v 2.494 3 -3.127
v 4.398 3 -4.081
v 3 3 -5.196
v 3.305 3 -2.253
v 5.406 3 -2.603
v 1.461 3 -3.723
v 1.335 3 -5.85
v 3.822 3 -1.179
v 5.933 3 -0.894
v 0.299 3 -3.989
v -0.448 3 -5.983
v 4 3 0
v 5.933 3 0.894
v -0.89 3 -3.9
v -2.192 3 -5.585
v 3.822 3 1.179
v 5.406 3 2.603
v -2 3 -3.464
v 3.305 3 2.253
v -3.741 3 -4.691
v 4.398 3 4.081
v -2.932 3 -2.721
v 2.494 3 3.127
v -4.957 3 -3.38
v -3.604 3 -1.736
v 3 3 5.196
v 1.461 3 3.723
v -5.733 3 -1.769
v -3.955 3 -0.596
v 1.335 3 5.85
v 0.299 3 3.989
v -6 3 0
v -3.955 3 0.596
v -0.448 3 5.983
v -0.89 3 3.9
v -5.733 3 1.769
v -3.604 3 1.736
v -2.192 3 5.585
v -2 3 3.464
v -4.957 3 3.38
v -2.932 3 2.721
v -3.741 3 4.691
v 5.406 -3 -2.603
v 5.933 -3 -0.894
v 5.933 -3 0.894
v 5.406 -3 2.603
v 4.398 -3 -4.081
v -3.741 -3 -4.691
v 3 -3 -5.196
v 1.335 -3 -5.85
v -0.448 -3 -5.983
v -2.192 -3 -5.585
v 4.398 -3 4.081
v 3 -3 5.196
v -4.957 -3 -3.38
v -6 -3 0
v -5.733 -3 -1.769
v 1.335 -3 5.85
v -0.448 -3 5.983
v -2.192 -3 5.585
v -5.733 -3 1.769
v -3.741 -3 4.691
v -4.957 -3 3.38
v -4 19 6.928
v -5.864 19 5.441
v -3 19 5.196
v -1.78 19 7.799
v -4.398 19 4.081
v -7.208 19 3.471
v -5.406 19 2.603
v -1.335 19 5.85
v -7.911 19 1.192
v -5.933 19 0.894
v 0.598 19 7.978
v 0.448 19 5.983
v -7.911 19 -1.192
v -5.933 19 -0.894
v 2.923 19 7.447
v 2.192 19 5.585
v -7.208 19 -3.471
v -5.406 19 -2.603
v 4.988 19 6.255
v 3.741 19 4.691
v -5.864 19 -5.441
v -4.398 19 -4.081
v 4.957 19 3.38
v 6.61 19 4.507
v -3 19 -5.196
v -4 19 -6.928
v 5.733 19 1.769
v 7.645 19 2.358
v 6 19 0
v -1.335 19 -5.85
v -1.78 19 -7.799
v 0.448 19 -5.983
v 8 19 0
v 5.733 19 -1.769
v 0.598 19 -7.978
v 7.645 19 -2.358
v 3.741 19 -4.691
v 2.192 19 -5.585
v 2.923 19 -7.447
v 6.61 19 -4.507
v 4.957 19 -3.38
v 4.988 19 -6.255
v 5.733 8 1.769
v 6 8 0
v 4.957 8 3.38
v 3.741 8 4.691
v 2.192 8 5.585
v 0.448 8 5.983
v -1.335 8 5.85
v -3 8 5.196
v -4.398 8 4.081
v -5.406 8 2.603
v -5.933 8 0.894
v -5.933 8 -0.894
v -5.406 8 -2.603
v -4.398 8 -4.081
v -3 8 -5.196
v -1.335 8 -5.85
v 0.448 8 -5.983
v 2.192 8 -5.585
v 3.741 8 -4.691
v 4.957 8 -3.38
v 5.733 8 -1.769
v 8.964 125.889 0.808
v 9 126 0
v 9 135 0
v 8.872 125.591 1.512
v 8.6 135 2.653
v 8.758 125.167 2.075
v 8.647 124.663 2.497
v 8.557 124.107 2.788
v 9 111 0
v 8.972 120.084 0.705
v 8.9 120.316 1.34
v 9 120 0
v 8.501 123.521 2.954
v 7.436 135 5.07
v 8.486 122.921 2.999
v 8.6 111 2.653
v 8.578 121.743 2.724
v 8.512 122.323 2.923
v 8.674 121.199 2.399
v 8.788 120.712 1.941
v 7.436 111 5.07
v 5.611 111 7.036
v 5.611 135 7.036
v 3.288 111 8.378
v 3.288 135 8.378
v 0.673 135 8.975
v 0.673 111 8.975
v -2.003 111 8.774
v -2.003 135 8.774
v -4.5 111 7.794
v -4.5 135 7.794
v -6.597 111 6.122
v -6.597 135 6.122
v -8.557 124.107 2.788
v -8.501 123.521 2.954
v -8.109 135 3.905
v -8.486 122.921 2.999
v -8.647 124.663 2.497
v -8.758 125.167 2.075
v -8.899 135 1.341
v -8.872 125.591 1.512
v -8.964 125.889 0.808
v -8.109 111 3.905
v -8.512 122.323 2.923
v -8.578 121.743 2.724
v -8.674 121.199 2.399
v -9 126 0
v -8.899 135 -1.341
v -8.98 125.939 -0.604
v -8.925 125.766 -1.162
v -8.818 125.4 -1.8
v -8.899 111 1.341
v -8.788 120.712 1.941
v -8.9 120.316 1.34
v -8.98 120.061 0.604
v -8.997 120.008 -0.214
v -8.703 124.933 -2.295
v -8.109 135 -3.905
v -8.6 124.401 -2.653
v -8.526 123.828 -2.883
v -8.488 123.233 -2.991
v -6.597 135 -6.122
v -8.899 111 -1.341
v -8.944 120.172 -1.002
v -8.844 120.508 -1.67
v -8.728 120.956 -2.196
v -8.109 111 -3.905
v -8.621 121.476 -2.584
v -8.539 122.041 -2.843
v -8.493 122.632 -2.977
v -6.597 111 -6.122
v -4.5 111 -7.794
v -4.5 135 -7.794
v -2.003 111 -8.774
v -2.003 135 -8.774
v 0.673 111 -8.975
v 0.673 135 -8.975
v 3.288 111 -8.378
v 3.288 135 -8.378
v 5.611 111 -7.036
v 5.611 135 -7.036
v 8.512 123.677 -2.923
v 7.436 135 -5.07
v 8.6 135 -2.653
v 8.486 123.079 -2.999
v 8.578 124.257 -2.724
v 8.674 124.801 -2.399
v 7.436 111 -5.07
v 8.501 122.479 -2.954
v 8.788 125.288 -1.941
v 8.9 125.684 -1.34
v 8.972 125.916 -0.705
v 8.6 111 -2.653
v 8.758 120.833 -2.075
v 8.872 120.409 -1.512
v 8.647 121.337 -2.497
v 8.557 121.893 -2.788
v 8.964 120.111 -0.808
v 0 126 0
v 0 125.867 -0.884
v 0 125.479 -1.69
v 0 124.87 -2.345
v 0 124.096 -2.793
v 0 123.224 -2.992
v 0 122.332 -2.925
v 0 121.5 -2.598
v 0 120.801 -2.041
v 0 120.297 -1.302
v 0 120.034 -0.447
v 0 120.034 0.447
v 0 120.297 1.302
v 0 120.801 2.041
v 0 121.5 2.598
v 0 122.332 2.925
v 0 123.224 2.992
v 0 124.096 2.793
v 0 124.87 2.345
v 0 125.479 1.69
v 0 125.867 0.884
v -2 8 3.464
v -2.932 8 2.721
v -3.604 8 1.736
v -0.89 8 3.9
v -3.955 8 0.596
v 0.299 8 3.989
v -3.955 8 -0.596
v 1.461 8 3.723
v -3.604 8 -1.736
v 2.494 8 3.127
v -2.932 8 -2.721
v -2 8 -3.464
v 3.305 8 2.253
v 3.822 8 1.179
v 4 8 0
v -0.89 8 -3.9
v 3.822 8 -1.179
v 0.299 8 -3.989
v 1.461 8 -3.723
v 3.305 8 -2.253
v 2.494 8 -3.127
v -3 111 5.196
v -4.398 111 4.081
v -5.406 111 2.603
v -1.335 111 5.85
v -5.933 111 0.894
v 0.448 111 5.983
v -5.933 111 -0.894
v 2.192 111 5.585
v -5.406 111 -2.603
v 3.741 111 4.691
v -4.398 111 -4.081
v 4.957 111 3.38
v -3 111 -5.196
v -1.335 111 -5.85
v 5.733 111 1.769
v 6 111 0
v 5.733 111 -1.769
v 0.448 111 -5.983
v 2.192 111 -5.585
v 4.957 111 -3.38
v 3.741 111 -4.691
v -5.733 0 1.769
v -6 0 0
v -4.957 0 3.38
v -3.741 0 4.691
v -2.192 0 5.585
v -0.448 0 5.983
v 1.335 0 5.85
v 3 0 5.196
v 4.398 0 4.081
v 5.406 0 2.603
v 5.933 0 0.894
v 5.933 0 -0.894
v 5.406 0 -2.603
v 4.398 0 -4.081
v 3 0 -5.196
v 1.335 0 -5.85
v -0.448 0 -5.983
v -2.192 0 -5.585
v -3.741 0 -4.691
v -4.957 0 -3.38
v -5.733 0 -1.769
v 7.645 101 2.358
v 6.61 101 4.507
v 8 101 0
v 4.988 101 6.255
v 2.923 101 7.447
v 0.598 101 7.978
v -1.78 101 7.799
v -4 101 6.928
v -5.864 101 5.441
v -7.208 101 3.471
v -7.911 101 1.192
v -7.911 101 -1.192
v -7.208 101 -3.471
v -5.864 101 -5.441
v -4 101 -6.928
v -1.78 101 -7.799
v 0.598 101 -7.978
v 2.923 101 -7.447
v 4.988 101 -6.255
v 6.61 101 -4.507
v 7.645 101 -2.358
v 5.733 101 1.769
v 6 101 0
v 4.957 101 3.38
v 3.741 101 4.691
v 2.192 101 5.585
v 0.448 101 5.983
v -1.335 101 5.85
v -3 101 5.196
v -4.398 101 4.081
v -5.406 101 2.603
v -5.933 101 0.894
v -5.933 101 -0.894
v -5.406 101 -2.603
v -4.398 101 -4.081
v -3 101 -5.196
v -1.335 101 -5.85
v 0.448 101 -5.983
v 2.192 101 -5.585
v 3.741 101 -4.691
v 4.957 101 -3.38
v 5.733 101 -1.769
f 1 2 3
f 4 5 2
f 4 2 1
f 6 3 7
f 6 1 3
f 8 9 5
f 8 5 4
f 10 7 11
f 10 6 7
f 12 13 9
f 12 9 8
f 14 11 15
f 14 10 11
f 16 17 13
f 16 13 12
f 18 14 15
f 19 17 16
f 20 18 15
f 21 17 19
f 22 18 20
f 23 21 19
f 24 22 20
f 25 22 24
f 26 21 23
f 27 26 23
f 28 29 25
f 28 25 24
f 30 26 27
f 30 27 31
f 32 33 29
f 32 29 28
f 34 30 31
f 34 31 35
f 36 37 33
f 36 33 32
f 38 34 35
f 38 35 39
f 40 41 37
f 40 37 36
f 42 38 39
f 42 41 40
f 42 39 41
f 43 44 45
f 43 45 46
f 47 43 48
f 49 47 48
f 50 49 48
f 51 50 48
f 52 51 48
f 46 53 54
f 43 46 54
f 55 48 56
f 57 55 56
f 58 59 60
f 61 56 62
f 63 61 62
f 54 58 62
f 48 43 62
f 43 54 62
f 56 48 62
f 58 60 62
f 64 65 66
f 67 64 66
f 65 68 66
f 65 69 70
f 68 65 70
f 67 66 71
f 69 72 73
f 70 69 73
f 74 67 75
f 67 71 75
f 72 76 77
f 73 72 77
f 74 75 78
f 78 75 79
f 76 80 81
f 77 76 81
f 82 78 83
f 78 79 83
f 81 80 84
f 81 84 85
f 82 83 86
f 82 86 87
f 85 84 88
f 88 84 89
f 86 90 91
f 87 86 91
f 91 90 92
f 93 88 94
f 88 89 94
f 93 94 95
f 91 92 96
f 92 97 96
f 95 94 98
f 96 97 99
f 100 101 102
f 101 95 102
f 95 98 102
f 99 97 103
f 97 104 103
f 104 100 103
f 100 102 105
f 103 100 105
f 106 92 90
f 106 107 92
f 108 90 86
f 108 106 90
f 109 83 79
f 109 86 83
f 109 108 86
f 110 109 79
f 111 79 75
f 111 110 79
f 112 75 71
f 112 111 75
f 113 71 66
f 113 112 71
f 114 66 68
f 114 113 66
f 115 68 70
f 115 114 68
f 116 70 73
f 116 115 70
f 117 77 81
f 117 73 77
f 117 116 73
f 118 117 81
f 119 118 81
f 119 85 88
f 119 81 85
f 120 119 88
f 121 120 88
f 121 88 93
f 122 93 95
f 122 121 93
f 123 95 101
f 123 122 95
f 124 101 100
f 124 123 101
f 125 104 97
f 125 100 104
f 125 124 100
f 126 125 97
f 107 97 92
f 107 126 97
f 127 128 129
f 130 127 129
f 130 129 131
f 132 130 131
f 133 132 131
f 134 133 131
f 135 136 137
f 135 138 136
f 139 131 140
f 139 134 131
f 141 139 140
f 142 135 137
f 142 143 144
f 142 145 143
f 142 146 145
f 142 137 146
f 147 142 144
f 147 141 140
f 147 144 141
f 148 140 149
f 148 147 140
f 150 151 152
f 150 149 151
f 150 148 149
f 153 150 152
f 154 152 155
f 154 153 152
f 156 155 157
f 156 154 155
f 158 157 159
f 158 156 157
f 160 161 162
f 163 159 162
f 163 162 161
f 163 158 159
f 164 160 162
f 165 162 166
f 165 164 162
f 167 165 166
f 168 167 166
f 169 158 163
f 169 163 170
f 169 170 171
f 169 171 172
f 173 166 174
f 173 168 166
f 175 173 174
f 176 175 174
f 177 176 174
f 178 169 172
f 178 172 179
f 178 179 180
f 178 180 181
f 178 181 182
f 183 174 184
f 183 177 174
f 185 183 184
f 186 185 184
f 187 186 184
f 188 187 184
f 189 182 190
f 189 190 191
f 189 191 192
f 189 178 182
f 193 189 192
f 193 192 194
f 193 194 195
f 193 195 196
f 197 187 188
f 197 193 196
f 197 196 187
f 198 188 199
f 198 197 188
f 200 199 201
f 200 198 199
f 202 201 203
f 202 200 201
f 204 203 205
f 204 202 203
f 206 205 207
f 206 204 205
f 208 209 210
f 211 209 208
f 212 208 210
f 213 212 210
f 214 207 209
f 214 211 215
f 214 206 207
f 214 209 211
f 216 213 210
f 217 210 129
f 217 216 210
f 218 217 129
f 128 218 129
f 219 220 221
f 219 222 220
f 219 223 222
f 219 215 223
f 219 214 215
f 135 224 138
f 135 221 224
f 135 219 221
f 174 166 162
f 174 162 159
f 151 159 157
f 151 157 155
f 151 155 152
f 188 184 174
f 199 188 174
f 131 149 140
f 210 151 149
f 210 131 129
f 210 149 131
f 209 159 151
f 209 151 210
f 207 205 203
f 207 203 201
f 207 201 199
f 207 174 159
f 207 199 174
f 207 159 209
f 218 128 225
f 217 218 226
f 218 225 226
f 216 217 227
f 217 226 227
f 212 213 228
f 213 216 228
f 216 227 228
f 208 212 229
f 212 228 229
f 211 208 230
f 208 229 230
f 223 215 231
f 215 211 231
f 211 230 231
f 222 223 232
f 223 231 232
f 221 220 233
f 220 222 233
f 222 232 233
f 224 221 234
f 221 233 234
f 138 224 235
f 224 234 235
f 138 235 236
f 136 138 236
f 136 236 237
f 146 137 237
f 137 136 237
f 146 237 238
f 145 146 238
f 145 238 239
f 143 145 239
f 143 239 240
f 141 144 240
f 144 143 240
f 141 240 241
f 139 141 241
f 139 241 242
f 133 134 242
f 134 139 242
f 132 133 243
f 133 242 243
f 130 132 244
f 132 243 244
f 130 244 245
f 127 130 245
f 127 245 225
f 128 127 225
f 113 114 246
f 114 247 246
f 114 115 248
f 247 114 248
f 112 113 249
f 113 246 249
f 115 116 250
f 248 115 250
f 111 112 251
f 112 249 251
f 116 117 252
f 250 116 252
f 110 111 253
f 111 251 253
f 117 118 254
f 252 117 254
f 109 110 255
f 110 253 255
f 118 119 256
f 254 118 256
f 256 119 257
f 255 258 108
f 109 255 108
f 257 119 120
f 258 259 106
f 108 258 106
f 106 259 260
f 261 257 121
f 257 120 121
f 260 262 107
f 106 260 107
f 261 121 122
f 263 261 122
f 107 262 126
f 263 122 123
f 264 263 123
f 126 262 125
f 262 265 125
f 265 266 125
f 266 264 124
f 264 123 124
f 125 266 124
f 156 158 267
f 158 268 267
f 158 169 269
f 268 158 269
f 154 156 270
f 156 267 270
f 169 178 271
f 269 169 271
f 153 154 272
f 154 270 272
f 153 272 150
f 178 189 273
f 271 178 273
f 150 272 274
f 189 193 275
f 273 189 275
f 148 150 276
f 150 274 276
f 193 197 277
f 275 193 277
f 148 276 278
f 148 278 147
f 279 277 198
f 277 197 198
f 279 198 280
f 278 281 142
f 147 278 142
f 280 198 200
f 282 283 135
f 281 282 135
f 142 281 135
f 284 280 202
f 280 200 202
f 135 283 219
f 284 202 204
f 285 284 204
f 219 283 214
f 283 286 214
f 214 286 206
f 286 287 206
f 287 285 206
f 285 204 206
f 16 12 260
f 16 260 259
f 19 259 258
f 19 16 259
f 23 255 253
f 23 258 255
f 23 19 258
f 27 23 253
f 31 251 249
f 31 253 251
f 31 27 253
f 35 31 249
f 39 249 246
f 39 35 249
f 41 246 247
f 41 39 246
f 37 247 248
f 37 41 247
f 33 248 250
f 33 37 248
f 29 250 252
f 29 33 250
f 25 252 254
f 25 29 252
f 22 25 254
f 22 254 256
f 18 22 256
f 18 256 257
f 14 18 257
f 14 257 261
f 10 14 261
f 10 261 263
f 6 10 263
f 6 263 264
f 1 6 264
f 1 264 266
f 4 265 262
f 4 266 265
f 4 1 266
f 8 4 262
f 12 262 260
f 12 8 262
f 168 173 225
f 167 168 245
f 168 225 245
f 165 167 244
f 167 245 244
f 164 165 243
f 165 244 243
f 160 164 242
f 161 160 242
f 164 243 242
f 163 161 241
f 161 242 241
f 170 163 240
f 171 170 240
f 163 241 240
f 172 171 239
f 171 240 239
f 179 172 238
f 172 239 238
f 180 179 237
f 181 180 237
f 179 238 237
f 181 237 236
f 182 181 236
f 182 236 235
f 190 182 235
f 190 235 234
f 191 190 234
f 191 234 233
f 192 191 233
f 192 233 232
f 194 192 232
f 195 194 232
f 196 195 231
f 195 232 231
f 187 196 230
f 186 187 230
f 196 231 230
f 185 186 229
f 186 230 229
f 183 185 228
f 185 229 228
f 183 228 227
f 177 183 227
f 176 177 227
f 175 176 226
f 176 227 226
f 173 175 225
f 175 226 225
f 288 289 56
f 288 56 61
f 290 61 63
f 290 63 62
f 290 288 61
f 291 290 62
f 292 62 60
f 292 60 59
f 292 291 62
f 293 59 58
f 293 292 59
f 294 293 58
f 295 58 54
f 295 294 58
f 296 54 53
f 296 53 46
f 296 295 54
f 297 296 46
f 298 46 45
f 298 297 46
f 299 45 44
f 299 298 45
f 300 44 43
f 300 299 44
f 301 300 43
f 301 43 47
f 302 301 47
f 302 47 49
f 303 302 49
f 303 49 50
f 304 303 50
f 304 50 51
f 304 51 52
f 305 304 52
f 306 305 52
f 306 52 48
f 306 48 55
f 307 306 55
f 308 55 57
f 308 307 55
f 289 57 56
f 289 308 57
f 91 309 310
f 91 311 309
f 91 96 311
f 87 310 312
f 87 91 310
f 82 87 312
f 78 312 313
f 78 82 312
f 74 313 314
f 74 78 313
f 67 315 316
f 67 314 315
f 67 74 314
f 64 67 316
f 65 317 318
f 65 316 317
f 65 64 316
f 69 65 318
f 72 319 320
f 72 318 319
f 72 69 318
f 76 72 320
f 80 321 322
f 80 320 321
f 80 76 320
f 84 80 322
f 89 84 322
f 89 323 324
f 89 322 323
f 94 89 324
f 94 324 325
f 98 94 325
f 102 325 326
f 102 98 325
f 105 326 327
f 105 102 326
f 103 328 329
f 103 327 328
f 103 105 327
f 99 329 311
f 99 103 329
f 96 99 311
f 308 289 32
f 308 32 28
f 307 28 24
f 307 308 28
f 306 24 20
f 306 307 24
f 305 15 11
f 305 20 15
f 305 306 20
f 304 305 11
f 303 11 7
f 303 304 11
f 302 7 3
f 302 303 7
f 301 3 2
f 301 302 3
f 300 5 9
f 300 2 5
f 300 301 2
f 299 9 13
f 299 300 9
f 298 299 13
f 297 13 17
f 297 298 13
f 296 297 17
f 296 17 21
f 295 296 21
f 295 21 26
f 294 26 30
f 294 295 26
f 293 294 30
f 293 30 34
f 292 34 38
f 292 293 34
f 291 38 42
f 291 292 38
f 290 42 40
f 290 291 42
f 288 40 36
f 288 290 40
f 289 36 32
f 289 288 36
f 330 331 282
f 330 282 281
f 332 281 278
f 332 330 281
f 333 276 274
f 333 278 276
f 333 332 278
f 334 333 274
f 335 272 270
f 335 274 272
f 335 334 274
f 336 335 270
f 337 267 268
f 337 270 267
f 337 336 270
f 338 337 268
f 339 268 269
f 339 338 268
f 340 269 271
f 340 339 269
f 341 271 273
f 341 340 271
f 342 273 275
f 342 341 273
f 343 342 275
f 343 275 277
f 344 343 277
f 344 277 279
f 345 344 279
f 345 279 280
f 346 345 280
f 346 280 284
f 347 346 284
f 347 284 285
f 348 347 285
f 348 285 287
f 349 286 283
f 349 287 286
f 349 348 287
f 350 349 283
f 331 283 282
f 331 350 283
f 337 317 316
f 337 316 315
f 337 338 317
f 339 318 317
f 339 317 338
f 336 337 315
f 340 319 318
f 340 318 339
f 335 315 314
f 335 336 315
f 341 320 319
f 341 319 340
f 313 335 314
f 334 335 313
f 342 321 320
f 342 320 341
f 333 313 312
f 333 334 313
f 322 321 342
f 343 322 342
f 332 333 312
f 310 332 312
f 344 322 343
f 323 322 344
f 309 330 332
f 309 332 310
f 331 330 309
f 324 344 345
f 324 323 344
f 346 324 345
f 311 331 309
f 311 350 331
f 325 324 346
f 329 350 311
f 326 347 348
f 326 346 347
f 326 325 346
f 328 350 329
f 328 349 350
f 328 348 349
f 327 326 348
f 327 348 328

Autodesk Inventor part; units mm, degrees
ref_plane "YZ Plane" through (0, 0, 0) normal (1, 0, 0) x (0, 1, 0)
ref_plane "XZ Plane" through (0, 0, 0) normal (0, 1, 0) x (-1, 0, 0)
ref_plane "XY Plane" through (0, 0, 0) normal (0, 0, 1) x (1, 0, 0)
sketch "Sketch1" plane through (0, 0, 0) normal (0, 1, 0) x (-1, 0, 0)
  circle A0 centre (0, 0) radius 6
  dimension "d0" = 12
extrude "Extrusion1" add sketch "Sketch1" along normal mid plane 6
sketch "Sketch2" plane through (0, 3, 0) normal (0, 1, 0) x (1, 0, 0)
  circle A0 centre (0, 0) radius 4
  dimension "d3" = 8
extrude "Extrusion2" add sketch "Sketch2" along normal blind 5
sketch "Sketch3" plane through (0, 8, 0) normal (0, 1, 0) x (1, 0, 0)
  circle A0 centre (0, 0) radius 6
  dimension "d6" = 12
extrude "Extrusion3" add sketch "Sketch3" along normal blind 11
sketch "Sketch4" plane through (0, 19, 0) normal (0, 1, 0) x (1, 0, 0)
  circle A0 centre (0, 0) radius 8
  dimension "d9" = 16
extrude "Extrusion4" add sketch "Sketch4" along normal blind 82
sketch "Sketch5" plane through (0, 101, 0) normal (0, 1, 0) x (1, 0, 0)
  circle A0 centre (0, 0) radius 6
  dimension "d12" = 12
extrude "Extrusion5" add sketch "Sketch5" along normal blind 10
sketch "Sketch6" plane through (0, 111, 0) normal (0, 1, 0) x (1, 0, 0)
  circle A0 centre (0, 0) radius 9
  dimension "d15" = 18
extrude "Extrusion6" add sketch "Sketch6" along normal blind 24
sketch "Sketch7" plane through (0, 0, 0) normal (1, 0, 0) x (0, 1, 0)
  circle A0 centre (123, 0) radius 3
  line L0 (111, -9) -> (111, 9) projected
  point P0 (0, 0)
  dimension "d18" = 6
  dimension "d19" = 12
extrude "Extrusion7" cut sketch "Sketch7" along normal mid plane 24
properties part number "Pieza09_Tornillo" material "Steel"
